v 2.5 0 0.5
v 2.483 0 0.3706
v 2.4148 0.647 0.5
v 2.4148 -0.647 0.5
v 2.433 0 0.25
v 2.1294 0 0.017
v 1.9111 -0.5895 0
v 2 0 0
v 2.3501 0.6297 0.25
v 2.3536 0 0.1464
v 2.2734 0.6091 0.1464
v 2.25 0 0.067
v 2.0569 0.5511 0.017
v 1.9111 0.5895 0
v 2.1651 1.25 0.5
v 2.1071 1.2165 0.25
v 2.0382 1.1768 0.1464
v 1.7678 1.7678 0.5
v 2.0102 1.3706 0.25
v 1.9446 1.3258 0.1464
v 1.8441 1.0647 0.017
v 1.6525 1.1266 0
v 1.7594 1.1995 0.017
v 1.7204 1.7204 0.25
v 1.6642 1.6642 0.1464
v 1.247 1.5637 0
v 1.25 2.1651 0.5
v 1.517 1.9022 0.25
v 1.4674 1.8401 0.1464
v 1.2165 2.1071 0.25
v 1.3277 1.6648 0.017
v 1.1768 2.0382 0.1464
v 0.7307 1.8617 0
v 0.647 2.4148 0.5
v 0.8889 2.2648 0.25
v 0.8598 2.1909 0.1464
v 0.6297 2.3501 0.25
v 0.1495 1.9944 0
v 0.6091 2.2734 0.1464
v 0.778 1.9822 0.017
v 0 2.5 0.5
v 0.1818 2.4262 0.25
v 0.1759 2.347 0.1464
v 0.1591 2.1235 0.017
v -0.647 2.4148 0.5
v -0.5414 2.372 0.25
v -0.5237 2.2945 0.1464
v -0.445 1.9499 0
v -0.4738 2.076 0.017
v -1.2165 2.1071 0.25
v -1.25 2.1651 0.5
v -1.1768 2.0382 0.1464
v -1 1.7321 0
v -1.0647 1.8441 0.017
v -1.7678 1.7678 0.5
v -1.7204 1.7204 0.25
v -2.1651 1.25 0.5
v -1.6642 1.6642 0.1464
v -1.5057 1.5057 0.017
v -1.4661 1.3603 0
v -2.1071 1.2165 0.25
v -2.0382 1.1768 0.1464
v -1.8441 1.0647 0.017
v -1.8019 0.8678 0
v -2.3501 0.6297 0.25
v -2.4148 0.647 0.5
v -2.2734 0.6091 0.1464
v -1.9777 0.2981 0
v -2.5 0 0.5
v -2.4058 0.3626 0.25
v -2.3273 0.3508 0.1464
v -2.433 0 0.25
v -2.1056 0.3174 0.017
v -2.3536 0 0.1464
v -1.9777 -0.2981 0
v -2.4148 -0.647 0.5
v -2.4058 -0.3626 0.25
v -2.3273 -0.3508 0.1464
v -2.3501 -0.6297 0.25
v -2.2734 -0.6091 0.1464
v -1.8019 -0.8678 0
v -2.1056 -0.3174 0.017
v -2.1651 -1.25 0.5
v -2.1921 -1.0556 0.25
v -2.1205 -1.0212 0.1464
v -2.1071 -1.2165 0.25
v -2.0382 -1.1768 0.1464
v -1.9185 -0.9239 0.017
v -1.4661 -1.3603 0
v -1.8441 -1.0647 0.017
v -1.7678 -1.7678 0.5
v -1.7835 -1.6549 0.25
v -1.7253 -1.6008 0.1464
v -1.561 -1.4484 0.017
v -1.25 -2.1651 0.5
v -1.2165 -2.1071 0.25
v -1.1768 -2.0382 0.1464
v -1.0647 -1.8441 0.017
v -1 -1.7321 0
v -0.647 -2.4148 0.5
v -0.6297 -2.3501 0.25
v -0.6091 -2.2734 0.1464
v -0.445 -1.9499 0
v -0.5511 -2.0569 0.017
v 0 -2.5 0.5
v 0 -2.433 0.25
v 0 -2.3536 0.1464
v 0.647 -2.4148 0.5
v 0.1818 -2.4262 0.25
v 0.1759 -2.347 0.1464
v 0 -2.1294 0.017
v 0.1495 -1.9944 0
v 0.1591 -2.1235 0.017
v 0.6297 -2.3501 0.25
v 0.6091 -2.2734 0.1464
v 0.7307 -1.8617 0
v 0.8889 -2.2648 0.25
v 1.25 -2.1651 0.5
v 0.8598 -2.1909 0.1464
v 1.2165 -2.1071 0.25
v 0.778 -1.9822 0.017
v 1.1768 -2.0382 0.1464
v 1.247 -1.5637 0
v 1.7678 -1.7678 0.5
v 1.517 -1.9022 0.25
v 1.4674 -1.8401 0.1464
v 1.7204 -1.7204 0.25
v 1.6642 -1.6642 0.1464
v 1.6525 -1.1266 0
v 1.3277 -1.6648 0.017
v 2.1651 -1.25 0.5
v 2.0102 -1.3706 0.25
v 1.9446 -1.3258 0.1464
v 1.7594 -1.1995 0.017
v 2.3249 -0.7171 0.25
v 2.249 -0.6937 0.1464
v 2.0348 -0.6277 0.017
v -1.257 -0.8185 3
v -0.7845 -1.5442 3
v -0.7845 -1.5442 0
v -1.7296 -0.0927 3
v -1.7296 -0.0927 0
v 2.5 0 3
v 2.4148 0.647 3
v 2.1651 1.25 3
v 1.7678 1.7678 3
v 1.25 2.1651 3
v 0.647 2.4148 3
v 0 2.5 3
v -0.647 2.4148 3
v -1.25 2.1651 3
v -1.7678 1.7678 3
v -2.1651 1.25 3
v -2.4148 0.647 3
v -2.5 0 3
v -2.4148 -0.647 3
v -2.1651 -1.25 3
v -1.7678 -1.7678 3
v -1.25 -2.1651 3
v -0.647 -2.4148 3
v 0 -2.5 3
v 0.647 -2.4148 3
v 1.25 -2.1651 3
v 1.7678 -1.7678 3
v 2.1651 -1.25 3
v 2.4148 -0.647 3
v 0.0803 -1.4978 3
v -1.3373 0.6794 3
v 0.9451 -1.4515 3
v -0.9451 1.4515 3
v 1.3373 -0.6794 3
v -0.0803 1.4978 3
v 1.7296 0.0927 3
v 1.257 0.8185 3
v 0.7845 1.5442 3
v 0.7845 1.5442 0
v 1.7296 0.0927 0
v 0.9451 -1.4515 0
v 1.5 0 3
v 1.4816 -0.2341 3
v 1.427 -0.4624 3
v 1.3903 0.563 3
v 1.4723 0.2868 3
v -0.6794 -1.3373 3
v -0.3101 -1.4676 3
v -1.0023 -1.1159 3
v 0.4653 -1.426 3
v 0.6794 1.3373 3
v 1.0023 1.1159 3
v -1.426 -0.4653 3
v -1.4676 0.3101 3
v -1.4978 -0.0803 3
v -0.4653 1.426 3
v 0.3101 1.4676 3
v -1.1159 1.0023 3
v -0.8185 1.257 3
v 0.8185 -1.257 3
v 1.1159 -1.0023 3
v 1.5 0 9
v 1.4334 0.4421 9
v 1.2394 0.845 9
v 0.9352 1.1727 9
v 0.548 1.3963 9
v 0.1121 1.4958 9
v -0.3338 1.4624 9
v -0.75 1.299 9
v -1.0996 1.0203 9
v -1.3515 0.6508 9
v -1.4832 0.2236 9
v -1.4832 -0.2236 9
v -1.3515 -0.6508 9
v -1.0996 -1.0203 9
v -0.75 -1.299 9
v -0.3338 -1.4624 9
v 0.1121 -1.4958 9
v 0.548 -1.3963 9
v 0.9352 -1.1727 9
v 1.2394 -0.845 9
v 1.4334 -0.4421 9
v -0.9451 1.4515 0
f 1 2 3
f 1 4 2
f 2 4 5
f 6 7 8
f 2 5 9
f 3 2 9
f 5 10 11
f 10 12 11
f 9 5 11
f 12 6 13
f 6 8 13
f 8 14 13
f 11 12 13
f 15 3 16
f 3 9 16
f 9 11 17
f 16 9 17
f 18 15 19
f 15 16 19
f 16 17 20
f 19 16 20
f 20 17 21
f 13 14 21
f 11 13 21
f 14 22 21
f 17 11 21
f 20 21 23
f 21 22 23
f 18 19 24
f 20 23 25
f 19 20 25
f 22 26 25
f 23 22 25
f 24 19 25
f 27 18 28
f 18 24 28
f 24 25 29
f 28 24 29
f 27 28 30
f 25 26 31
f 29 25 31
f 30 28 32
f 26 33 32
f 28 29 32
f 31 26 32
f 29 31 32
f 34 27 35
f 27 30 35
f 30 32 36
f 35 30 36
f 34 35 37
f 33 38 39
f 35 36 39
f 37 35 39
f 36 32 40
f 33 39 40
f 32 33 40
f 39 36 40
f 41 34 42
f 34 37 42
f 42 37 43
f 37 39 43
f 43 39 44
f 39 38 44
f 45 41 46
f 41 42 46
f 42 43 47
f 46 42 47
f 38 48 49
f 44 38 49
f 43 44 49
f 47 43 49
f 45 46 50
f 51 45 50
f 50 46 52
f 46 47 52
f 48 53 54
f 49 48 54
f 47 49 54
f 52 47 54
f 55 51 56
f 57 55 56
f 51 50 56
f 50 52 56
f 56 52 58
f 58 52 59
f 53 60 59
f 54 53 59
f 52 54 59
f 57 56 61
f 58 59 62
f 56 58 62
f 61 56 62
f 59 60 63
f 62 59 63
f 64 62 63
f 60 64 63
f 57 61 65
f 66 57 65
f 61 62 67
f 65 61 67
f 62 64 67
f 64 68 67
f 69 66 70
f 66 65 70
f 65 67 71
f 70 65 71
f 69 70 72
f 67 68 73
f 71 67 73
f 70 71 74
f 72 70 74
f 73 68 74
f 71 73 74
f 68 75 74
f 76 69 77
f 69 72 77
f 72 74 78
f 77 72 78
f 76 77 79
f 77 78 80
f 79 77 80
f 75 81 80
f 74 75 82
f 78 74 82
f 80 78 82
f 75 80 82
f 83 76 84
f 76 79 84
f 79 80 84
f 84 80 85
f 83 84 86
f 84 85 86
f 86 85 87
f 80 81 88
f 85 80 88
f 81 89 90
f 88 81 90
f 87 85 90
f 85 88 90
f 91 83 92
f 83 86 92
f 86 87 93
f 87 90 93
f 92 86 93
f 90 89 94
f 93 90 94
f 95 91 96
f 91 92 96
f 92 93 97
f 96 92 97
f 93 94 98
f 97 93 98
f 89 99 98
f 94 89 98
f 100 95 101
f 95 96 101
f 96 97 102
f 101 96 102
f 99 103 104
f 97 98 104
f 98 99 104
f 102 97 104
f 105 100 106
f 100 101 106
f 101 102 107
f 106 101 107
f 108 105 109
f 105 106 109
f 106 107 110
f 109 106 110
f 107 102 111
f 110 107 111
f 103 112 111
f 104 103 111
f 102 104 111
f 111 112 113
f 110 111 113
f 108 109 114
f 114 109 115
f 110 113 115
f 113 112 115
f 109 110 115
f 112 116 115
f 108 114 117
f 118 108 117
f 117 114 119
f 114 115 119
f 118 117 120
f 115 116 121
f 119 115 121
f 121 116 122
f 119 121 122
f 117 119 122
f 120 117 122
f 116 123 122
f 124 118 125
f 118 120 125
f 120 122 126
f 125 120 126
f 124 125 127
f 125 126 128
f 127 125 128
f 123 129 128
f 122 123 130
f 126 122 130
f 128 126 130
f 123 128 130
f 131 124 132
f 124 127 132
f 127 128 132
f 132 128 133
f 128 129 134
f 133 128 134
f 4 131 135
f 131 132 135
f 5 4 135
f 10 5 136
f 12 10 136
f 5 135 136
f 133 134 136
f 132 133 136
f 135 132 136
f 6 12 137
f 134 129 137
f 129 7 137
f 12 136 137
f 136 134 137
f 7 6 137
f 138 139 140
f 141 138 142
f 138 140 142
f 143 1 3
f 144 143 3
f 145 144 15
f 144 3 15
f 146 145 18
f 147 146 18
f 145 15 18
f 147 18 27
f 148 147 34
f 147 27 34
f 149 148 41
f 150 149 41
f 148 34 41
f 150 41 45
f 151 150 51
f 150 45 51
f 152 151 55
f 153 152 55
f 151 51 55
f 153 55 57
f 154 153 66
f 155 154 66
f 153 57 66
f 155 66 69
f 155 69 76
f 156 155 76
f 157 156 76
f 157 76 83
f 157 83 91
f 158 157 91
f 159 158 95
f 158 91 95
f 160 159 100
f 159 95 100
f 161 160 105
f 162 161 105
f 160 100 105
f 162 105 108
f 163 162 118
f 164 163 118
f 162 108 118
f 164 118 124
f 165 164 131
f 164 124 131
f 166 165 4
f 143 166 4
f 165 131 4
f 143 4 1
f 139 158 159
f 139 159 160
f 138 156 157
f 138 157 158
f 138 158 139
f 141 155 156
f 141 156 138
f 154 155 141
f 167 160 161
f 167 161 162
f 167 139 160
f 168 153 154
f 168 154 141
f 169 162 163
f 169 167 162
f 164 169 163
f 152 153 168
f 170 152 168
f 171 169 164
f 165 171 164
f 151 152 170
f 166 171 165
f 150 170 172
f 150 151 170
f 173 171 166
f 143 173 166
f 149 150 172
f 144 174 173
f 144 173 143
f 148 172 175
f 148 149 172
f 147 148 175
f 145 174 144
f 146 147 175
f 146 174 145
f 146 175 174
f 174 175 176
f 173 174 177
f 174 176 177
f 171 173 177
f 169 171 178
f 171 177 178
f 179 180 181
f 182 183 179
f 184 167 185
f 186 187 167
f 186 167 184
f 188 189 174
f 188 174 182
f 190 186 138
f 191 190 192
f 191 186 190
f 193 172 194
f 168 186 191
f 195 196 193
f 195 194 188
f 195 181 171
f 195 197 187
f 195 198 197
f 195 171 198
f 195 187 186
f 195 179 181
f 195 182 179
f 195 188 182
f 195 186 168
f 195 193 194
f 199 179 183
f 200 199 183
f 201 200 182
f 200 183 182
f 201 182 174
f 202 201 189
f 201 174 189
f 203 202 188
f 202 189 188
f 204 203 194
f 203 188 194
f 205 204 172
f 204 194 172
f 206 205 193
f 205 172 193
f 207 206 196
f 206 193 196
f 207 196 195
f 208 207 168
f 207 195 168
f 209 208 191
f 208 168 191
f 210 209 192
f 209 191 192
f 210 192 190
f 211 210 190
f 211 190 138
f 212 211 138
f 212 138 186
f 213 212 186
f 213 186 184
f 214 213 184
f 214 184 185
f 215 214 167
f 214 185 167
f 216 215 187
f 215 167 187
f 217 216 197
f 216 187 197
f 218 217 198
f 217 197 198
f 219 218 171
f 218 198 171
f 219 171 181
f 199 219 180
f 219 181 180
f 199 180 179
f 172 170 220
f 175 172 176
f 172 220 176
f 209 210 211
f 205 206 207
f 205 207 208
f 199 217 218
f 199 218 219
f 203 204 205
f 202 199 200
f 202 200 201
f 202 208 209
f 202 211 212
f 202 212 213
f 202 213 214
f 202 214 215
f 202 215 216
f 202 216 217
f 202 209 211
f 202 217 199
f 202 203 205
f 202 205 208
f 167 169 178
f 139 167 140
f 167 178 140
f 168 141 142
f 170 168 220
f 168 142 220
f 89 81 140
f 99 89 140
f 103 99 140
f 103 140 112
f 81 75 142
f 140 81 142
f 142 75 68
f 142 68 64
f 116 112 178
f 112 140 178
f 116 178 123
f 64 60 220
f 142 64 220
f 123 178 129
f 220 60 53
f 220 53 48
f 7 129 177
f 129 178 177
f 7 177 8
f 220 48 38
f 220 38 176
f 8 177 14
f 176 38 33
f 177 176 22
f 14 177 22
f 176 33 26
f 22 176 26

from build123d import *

# Parameters (mm, degrees)
SKETCH1_R           = 2.5
BOSS_EXTRUDE1_DEPTH = 3
SKETCH2_R           = 1.5
BOSS_EXTRUDE2_DEPTH = 6
CUT_EXTRUDE1_DEPTH  = 3
FILLET1_R           = 0.5


with BuildPart() as part:
    # Sketch1 → Boss-Extrude1 (new body)
    with BuildSketch(Plane.XY):
        Circle(SKETCH1_R)
    extrude(amount=BOSS_EXTRUDE1_DEPTH)

    # Sketch2 → Boss-Extrude2 (add)
    with BuildSketch(Plane.XY.offset(3)):
        Circle(SKETCH2_R)
    extrude(amount=BOSS_EXTRUDE2_DEPTH)

    # Sketch3 → Cut-Extrude1 (cut)
    with BuildSketch(Plane(origin=(0, 0, 0), x_dir=(-1, 0, 0), z_dir=(0, 0, -1))):
        Polygon((0.784462107, -1.544221229), (1.729565866, -0.092746502), (0.94510376, 1.451474727), (-0.784462107, 1.544221229), (-1.729565866, 0.092746502), (-0.94510376, -1.451474727), align=None)
    extrude(amount=-CUT_EXTRUDE1_DEPTH, mode=Mode.SUBTRACT)

    # Fillet1
    fillet1_edges = [part.edges().sort_by_distance(p)[0] for p in [
        (-2.5, 0, 0),
    ]]
    fillet(fillet1_edges, radius=FILLET1_R)


solid = part.part
